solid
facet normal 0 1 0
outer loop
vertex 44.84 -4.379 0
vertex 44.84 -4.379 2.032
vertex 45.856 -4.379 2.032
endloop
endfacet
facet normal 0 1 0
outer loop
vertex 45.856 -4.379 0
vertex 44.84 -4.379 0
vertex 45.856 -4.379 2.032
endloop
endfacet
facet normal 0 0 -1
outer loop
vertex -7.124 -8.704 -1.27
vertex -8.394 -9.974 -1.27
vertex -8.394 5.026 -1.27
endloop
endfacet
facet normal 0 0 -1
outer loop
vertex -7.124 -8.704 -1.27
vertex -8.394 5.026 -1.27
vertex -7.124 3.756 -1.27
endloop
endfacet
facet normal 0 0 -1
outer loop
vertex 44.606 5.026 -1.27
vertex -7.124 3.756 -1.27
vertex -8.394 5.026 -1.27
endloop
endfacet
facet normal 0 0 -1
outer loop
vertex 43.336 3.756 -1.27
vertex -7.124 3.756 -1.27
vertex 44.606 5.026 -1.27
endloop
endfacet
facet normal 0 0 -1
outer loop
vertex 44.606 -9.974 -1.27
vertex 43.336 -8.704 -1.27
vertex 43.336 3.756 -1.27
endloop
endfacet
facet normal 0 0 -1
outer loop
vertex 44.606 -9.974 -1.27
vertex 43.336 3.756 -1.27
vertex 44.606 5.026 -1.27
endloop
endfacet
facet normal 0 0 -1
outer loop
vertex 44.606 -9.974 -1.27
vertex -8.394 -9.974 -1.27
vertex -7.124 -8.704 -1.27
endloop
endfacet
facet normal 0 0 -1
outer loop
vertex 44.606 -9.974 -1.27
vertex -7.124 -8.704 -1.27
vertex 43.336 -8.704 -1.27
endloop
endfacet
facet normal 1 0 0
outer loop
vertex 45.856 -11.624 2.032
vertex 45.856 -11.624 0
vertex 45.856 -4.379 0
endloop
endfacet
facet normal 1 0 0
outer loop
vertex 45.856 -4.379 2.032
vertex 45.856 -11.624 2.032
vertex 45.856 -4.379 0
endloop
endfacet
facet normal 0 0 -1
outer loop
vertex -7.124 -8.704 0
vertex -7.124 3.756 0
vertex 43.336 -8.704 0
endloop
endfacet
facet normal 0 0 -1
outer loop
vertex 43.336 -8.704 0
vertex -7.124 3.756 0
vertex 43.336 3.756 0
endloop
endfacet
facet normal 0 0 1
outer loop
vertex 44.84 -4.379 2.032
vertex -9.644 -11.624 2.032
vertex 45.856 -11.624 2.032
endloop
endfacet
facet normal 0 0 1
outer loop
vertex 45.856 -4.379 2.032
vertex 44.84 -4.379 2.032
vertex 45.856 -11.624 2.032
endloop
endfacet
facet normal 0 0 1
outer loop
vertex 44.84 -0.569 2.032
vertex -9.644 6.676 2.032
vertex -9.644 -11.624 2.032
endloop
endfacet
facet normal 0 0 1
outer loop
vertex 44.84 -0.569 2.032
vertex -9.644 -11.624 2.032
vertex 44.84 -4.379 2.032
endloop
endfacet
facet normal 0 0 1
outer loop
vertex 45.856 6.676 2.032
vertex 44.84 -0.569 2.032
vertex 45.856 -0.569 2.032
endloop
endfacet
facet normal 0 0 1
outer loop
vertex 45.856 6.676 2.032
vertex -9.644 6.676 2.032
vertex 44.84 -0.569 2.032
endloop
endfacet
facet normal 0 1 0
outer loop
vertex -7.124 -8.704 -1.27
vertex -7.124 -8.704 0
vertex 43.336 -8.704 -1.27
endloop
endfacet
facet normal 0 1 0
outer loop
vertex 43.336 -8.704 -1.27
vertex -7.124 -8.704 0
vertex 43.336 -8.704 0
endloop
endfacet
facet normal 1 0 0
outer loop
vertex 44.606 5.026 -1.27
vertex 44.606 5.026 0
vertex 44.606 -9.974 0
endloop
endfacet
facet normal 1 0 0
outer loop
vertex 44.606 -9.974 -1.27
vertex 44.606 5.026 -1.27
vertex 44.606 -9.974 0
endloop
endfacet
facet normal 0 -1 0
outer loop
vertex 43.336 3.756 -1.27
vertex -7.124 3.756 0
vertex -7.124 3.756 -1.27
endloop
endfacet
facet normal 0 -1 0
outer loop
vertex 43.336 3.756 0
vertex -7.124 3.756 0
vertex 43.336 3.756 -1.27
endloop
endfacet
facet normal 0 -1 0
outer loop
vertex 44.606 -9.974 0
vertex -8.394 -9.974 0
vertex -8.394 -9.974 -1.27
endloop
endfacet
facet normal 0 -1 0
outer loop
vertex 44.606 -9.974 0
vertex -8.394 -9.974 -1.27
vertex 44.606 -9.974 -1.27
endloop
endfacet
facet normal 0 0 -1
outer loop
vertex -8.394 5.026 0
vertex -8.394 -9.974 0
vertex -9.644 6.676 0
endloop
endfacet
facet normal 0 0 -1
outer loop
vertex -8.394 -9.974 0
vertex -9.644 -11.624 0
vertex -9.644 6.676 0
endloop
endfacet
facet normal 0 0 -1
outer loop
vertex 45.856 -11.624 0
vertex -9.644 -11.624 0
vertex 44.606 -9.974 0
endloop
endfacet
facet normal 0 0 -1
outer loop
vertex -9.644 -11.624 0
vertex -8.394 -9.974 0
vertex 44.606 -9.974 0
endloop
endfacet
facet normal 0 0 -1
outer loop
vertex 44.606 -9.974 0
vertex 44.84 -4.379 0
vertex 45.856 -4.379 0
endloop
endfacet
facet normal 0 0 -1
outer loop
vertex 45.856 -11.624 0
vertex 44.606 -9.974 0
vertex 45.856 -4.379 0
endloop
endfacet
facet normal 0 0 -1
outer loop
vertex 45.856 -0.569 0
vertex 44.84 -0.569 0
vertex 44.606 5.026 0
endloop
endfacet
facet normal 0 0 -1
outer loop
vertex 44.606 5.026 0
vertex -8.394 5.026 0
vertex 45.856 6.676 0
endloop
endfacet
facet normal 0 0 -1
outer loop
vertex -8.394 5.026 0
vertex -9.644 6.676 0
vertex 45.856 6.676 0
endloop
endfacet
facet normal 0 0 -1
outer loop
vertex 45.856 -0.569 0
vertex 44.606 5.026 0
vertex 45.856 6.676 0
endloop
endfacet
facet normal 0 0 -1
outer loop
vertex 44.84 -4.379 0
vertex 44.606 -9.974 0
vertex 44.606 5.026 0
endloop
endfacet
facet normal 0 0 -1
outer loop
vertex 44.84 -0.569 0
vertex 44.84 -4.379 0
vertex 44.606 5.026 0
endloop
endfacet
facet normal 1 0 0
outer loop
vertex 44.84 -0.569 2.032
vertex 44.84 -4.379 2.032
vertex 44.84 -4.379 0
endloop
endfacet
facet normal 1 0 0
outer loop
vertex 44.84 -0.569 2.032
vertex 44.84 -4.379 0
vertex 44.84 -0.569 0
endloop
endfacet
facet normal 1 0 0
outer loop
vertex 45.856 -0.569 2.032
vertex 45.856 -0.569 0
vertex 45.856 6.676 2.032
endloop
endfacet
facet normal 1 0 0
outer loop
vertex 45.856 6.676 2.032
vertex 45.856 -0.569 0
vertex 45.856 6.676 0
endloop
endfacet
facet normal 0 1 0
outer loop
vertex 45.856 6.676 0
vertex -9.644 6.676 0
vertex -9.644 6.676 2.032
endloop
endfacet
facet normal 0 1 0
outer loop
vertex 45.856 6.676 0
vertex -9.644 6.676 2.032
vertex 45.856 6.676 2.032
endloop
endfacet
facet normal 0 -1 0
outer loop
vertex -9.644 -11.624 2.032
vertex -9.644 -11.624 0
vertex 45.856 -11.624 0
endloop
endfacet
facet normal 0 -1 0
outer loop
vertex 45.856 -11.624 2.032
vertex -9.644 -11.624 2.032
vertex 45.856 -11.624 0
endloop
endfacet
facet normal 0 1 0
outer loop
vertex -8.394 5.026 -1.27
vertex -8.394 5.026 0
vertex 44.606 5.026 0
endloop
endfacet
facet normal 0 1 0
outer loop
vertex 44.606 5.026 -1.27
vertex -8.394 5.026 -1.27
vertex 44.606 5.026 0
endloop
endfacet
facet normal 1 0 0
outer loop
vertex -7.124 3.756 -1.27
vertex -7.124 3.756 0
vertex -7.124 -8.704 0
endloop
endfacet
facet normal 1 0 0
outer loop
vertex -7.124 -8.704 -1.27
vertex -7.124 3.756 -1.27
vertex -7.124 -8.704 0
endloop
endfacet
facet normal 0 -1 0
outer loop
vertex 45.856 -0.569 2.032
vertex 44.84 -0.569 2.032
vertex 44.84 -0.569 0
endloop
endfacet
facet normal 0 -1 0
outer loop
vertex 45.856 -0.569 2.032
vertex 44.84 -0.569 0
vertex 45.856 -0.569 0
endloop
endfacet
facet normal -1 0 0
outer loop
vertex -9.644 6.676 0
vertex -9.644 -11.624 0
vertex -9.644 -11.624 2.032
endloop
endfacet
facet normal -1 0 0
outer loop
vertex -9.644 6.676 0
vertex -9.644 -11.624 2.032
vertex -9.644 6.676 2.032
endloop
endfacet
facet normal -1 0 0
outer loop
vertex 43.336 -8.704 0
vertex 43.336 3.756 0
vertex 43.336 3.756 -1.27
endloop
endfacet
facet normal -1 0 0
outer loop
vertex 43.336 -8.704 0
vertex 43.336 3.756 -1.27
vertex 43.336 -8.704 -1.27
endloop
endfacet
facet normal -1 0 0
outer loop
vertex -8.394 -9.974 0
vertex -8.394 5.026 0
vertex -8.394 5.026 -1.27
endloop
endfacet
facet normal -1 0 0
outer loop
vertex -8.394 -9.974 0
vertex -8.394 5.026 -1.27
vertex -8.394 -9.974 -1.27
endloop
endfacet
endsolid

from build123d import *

# Parameters (mm, degrees)
F0_W     = 55.5
F0_H     = 18.3
F1_DEPTH = 2.032
F2_W     = 1.016
F2_H     = 3.81
F3_DEPTH = 2.286
F4_W     = 53
F4_H     = 15
F4_W_2   = 50.46
F4_H_2   = 12.46
F5_DEPTH = 1.27


with BuildPart() as f1:
    # F0 (on Top) → F1 (new body)
    with BuildSketch(Plane.XY):
        with Locations((18.105972, -2.473817)):
            Rectangle(F0_W, F0_H)
    extrude(amount=F1_DEPTH)

    # F2 (on face) → F3 (cut)
    with BuildSketch(Plane.XY.offset(2.032)):
        with Locations((45.347972, -2.473817)):
            Rectangle(F2_W, F2_H)
    extrude(amount=-F3_DEPTH, mode=Mode.SUBTRACT)

    # F4 (on face) → F5 (join)
    with BuildSketch(Plane(origin=(0, 0, 0), x_dir=(1, 0, 0), z_dir=(0, 0, -1))):
        with Locations((18.105972, 2.473817)):
            Rectangle(F4_W, F4_H)
        with Locations((18.105972, 2.473817)):
            Rectangle(F4_W_2, F4_H_2, mode=Mode.SUBTRACT)
    extrude(amount=F5_DEPTH)


solid = f1.part
